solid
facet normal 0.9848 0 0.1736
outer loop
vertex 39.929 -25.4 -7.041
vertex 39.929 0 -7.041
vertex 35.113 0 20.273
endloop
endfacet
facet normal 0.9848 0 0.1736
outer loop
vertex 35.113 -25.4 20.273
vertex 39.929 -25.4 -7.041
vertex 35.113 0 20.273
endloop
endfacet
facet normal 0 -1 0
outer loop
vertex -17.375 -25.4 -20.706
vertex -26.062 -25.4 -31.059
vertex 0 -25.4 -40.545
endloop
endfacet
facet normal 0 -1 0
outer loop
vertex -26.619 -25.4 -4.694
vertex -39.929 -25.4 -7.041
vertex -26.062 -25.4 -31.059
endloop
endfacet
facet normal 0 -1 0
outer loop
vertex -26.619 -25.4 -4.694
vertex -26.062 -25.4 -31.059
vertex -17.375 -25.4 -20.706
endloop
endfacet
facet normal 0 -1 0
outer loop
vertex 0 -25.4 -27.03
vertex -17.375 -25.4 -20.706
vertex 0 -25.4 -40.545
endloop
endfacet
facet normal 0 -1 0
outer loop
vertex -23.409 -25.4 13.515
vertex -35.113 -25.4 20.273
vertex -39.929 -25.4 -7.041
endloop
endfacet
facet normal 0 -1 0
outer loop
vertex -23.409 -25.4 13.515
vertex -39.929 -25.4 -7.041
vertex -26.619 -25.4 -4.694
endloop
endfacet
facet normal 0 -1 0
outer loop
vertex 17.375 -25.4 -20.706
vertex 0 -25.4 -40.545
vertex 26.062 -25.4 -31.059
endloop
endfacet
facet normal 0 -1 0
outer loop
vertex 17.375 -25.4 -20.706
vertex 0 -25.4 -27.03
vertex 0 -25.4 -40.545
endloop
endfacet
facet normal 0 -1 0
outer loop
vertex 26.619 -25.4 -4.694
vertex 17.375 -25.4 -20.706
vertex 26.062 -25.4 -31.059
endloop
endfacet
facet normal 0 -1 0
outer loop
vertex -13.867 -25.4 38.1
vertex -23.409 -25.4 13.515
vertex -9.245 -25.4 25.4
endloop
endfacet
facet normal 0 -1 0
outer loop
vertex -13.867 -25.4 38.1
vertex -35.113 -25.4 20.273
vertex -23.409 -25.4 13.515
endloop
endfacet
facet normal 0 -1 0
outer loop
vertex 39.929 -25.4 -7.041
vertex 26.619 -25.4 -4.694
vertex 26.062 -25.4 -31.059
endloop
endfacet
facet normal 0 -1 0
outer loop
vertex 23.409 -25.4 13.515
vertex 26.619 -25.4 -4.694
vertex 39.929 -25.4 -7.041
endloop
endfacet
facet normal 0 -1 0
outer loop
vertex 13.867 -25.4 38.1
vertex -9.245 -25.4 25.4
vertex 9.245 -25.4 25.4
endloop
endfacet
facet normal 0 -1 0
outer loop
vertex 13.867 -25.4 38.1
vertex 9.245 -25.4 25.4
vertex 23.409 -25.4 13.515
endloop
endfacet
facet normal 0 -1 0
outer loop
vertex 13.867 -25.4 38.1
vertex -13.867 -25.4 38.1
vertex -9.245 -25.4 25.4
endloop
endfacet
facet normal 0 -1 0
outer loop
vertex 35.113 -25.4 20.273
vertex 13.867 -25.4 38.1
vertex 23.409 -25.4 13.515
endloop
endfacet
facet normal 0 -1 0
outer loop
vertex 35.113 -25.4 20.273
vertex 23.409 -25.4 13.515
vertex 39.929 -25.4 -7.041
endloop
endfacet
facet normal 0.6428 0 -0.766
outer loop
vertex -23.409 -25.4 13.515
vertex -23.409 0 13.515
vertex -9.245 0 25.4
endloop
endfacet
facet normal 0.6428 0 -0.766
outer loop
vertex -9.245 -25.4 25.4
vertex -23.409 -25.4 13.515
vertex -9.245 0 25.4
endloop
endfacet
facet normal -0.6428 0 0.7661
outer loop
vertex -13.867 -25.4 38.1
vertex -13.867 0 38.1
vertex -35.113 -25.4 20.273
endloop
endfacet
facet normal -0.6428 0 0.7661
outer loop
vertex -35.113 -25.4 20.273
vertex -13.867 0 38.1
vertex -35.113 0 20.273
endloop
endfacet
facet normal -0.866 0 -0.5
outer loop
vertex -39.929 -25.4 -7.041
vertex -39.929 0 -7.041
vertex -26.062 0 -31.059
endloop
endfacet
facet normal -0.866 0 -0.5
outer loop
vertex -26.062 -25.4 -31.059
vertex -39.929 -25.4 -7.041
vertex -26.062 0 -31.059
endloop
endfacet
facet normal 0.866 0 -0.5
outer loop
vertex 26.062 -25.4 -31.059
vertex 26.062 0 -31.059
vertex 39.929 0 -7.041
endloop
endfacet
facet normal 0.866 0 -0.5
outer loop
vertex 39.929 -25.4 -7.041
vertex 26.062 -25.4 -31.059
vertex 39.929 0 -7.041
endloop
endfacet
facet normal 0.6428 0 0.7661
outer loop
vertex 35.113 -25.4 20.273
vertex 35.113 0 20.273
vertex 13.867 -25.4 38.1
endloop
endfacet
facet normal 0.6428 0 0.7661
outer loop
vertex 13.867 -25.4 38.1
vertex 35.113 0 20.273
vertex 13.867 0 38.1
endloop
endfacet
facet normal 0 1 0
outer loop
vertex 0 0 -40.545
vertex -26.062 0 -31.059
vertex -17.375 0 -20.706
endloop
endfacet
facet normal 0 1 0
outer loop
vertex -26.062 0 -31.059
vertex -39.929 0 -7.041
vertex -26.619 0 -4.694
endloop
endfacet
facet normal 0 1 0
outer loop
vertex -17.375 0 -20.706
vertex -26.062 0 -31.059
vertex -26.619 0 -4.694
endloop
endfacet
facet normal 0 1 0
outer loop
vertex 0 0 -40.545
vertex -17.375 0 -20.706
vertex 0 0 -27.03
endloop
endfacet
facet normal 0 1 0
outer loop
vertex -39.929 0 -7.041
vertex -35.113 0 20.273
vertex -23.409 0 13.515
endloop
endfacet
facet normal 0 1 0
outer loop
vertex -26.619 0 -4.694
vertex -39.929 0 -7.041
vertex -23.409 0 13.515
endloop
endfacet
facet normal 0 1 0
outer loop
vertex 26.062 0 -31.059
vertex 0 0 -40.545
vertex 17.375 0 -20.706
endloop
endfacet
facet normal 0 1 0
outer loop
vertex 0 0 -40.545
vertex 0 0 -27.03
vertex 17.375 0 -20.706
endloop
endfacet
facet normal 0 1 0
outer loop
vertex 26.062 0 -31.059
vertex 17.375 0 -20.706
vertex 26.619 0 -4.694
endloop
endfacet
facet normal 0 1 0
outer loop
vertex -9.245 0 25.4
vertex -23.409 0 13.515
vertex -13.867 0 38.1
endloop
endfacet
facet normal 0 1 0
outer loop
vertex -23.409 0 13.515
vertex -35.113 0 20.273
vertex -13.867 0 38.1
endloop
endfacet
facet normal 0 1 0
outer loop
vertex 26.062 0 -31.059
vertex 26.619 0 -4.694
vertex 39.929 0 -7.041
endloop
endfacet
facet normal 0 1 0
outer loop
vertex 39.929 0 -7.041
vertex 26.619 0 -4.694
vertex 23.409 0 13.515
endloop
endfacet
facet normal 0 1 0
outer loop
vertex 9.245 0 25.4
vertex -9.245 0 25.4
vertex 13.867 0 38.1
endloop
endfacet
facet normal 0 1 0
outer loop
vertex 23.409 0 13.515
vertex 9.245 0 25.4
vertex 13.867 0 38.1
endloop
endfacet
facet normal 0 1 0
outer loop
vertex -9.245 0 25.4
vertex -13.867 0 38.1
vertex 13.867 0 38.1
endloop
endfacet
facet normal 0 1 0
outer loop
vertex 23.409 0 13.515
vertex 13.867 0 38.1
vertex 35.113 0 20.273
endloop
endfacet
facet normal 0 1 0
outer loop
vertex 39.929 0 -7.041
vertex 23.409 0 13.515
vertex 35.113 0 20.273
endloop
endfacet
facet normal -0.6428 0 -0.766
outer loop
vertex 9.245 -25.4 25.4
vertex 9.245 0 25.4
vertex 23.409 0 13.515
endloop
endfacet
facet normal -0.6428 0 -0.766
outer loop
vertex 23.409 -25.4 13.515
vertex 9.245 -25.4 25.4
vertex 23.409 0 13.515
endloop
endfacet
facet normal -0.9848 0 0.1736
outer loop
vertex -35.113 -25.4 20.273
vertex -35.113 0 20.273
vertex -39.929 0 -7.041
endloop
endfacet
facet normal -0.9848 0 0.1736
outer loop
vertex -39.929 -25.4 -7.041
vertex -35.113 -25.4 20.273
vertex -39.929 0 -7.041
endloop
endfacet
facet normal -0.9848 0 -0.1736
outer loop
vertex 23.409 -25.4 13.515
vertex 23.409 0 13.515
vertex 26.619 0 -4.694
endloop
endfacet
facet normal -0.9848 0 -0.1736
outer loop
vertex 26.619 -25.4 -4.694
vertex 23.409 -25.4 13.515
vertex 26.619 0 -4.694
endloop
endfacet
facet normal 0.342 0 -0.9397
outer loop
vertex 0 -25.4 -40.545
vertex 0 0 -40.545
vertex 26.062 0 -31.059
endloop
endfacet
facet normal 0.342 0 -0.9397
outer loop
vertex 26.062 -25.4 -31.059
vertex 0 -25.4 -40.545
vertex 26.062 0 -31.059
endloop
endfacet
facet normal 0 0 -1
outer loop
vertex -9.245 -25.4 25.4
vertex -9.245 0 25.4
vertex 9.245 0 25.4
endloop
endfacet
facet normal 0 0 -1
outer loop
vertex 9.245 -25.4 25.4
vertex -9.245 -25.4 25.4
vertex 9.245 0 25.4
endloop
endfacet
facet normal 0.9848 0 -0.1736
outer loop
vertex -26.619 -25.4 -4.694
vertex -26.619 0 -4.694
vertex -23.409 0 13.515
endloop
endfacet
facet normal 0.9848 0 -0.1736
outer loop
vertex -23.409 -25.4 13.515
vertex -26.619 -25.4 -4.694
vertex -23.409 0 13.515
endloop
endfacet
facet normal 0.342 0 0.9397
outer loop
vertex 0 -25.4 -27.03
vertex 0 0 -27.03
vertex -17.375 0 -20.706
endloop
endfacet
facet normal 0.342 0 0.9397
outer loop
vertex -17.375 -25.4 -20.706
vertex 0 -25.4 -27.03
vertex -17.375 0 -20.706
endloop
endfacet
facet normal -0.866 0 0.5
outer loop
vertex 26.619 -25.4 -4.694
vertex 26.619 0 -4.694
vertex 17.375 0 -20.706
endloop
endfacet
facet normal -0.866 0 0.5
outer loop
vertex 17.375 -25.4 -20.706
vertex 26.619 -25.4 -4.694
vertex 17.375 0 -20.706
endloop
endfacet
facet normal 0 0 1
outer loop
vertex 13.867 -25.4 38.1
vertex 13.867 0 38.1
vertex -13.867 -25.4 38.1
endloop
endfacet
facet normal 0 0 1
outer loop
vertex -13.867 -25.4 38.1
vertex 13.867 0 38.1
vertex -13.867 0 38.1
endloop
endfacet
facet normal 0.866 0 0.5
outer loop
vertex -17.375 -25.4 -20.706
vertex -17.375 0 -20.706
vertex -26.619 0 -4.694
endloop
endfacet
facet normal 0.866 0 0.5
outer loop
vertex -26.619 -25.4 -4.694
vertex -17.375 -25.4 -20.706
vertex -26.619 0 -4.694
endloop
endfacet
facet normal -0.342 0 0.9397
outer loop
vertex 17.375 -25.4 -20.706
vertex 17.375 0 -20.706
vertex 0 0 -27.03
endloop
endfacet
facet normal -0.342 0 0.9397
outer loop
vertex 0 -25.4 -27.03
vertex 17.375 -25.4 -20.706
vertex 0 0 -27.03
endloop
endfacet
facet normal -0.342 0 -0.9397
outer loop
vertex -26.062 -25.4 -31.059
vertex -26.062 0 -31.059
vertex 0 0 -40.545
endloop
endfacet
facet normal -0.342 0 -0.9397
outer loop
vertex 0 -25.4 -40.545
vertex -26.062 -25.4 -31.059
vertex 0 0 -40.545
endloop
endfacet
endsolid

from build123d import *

# Parameters (mm, degrees)
F1_DEPTH = 25.4


with BuildPart() as f1:
    # F0 (on Front) → F1 (new body)
    with BuildSketch(Plane.XZ):
        Polygon((13.867266, 38.1), (0, 38.1), (-13.867266, 38.1), (-35.11315, 20.272587), (-39.929201, -7.040595), (-26.061935, -31.059405), (0, -40.545173), (26.061935, -31.059405), (39.929201, -7.040595), (35.11315, 20.272587), align=None)
        Polygon((-9.244844, 25.4), (0, 25.4), (9.244844, 25.4), (23.408767, 13.515058), (26.619467, -4.69373), (17.374623, -20.70627), (0, -27.030115), (-17.374623, -20.70627), (-26.619467, -4.69373), (-23.408767, 13.515058), align=None, mode=Mode.SUBTRACT)
    extrude(amount=F1_DEPTH)


solid = f1.part
